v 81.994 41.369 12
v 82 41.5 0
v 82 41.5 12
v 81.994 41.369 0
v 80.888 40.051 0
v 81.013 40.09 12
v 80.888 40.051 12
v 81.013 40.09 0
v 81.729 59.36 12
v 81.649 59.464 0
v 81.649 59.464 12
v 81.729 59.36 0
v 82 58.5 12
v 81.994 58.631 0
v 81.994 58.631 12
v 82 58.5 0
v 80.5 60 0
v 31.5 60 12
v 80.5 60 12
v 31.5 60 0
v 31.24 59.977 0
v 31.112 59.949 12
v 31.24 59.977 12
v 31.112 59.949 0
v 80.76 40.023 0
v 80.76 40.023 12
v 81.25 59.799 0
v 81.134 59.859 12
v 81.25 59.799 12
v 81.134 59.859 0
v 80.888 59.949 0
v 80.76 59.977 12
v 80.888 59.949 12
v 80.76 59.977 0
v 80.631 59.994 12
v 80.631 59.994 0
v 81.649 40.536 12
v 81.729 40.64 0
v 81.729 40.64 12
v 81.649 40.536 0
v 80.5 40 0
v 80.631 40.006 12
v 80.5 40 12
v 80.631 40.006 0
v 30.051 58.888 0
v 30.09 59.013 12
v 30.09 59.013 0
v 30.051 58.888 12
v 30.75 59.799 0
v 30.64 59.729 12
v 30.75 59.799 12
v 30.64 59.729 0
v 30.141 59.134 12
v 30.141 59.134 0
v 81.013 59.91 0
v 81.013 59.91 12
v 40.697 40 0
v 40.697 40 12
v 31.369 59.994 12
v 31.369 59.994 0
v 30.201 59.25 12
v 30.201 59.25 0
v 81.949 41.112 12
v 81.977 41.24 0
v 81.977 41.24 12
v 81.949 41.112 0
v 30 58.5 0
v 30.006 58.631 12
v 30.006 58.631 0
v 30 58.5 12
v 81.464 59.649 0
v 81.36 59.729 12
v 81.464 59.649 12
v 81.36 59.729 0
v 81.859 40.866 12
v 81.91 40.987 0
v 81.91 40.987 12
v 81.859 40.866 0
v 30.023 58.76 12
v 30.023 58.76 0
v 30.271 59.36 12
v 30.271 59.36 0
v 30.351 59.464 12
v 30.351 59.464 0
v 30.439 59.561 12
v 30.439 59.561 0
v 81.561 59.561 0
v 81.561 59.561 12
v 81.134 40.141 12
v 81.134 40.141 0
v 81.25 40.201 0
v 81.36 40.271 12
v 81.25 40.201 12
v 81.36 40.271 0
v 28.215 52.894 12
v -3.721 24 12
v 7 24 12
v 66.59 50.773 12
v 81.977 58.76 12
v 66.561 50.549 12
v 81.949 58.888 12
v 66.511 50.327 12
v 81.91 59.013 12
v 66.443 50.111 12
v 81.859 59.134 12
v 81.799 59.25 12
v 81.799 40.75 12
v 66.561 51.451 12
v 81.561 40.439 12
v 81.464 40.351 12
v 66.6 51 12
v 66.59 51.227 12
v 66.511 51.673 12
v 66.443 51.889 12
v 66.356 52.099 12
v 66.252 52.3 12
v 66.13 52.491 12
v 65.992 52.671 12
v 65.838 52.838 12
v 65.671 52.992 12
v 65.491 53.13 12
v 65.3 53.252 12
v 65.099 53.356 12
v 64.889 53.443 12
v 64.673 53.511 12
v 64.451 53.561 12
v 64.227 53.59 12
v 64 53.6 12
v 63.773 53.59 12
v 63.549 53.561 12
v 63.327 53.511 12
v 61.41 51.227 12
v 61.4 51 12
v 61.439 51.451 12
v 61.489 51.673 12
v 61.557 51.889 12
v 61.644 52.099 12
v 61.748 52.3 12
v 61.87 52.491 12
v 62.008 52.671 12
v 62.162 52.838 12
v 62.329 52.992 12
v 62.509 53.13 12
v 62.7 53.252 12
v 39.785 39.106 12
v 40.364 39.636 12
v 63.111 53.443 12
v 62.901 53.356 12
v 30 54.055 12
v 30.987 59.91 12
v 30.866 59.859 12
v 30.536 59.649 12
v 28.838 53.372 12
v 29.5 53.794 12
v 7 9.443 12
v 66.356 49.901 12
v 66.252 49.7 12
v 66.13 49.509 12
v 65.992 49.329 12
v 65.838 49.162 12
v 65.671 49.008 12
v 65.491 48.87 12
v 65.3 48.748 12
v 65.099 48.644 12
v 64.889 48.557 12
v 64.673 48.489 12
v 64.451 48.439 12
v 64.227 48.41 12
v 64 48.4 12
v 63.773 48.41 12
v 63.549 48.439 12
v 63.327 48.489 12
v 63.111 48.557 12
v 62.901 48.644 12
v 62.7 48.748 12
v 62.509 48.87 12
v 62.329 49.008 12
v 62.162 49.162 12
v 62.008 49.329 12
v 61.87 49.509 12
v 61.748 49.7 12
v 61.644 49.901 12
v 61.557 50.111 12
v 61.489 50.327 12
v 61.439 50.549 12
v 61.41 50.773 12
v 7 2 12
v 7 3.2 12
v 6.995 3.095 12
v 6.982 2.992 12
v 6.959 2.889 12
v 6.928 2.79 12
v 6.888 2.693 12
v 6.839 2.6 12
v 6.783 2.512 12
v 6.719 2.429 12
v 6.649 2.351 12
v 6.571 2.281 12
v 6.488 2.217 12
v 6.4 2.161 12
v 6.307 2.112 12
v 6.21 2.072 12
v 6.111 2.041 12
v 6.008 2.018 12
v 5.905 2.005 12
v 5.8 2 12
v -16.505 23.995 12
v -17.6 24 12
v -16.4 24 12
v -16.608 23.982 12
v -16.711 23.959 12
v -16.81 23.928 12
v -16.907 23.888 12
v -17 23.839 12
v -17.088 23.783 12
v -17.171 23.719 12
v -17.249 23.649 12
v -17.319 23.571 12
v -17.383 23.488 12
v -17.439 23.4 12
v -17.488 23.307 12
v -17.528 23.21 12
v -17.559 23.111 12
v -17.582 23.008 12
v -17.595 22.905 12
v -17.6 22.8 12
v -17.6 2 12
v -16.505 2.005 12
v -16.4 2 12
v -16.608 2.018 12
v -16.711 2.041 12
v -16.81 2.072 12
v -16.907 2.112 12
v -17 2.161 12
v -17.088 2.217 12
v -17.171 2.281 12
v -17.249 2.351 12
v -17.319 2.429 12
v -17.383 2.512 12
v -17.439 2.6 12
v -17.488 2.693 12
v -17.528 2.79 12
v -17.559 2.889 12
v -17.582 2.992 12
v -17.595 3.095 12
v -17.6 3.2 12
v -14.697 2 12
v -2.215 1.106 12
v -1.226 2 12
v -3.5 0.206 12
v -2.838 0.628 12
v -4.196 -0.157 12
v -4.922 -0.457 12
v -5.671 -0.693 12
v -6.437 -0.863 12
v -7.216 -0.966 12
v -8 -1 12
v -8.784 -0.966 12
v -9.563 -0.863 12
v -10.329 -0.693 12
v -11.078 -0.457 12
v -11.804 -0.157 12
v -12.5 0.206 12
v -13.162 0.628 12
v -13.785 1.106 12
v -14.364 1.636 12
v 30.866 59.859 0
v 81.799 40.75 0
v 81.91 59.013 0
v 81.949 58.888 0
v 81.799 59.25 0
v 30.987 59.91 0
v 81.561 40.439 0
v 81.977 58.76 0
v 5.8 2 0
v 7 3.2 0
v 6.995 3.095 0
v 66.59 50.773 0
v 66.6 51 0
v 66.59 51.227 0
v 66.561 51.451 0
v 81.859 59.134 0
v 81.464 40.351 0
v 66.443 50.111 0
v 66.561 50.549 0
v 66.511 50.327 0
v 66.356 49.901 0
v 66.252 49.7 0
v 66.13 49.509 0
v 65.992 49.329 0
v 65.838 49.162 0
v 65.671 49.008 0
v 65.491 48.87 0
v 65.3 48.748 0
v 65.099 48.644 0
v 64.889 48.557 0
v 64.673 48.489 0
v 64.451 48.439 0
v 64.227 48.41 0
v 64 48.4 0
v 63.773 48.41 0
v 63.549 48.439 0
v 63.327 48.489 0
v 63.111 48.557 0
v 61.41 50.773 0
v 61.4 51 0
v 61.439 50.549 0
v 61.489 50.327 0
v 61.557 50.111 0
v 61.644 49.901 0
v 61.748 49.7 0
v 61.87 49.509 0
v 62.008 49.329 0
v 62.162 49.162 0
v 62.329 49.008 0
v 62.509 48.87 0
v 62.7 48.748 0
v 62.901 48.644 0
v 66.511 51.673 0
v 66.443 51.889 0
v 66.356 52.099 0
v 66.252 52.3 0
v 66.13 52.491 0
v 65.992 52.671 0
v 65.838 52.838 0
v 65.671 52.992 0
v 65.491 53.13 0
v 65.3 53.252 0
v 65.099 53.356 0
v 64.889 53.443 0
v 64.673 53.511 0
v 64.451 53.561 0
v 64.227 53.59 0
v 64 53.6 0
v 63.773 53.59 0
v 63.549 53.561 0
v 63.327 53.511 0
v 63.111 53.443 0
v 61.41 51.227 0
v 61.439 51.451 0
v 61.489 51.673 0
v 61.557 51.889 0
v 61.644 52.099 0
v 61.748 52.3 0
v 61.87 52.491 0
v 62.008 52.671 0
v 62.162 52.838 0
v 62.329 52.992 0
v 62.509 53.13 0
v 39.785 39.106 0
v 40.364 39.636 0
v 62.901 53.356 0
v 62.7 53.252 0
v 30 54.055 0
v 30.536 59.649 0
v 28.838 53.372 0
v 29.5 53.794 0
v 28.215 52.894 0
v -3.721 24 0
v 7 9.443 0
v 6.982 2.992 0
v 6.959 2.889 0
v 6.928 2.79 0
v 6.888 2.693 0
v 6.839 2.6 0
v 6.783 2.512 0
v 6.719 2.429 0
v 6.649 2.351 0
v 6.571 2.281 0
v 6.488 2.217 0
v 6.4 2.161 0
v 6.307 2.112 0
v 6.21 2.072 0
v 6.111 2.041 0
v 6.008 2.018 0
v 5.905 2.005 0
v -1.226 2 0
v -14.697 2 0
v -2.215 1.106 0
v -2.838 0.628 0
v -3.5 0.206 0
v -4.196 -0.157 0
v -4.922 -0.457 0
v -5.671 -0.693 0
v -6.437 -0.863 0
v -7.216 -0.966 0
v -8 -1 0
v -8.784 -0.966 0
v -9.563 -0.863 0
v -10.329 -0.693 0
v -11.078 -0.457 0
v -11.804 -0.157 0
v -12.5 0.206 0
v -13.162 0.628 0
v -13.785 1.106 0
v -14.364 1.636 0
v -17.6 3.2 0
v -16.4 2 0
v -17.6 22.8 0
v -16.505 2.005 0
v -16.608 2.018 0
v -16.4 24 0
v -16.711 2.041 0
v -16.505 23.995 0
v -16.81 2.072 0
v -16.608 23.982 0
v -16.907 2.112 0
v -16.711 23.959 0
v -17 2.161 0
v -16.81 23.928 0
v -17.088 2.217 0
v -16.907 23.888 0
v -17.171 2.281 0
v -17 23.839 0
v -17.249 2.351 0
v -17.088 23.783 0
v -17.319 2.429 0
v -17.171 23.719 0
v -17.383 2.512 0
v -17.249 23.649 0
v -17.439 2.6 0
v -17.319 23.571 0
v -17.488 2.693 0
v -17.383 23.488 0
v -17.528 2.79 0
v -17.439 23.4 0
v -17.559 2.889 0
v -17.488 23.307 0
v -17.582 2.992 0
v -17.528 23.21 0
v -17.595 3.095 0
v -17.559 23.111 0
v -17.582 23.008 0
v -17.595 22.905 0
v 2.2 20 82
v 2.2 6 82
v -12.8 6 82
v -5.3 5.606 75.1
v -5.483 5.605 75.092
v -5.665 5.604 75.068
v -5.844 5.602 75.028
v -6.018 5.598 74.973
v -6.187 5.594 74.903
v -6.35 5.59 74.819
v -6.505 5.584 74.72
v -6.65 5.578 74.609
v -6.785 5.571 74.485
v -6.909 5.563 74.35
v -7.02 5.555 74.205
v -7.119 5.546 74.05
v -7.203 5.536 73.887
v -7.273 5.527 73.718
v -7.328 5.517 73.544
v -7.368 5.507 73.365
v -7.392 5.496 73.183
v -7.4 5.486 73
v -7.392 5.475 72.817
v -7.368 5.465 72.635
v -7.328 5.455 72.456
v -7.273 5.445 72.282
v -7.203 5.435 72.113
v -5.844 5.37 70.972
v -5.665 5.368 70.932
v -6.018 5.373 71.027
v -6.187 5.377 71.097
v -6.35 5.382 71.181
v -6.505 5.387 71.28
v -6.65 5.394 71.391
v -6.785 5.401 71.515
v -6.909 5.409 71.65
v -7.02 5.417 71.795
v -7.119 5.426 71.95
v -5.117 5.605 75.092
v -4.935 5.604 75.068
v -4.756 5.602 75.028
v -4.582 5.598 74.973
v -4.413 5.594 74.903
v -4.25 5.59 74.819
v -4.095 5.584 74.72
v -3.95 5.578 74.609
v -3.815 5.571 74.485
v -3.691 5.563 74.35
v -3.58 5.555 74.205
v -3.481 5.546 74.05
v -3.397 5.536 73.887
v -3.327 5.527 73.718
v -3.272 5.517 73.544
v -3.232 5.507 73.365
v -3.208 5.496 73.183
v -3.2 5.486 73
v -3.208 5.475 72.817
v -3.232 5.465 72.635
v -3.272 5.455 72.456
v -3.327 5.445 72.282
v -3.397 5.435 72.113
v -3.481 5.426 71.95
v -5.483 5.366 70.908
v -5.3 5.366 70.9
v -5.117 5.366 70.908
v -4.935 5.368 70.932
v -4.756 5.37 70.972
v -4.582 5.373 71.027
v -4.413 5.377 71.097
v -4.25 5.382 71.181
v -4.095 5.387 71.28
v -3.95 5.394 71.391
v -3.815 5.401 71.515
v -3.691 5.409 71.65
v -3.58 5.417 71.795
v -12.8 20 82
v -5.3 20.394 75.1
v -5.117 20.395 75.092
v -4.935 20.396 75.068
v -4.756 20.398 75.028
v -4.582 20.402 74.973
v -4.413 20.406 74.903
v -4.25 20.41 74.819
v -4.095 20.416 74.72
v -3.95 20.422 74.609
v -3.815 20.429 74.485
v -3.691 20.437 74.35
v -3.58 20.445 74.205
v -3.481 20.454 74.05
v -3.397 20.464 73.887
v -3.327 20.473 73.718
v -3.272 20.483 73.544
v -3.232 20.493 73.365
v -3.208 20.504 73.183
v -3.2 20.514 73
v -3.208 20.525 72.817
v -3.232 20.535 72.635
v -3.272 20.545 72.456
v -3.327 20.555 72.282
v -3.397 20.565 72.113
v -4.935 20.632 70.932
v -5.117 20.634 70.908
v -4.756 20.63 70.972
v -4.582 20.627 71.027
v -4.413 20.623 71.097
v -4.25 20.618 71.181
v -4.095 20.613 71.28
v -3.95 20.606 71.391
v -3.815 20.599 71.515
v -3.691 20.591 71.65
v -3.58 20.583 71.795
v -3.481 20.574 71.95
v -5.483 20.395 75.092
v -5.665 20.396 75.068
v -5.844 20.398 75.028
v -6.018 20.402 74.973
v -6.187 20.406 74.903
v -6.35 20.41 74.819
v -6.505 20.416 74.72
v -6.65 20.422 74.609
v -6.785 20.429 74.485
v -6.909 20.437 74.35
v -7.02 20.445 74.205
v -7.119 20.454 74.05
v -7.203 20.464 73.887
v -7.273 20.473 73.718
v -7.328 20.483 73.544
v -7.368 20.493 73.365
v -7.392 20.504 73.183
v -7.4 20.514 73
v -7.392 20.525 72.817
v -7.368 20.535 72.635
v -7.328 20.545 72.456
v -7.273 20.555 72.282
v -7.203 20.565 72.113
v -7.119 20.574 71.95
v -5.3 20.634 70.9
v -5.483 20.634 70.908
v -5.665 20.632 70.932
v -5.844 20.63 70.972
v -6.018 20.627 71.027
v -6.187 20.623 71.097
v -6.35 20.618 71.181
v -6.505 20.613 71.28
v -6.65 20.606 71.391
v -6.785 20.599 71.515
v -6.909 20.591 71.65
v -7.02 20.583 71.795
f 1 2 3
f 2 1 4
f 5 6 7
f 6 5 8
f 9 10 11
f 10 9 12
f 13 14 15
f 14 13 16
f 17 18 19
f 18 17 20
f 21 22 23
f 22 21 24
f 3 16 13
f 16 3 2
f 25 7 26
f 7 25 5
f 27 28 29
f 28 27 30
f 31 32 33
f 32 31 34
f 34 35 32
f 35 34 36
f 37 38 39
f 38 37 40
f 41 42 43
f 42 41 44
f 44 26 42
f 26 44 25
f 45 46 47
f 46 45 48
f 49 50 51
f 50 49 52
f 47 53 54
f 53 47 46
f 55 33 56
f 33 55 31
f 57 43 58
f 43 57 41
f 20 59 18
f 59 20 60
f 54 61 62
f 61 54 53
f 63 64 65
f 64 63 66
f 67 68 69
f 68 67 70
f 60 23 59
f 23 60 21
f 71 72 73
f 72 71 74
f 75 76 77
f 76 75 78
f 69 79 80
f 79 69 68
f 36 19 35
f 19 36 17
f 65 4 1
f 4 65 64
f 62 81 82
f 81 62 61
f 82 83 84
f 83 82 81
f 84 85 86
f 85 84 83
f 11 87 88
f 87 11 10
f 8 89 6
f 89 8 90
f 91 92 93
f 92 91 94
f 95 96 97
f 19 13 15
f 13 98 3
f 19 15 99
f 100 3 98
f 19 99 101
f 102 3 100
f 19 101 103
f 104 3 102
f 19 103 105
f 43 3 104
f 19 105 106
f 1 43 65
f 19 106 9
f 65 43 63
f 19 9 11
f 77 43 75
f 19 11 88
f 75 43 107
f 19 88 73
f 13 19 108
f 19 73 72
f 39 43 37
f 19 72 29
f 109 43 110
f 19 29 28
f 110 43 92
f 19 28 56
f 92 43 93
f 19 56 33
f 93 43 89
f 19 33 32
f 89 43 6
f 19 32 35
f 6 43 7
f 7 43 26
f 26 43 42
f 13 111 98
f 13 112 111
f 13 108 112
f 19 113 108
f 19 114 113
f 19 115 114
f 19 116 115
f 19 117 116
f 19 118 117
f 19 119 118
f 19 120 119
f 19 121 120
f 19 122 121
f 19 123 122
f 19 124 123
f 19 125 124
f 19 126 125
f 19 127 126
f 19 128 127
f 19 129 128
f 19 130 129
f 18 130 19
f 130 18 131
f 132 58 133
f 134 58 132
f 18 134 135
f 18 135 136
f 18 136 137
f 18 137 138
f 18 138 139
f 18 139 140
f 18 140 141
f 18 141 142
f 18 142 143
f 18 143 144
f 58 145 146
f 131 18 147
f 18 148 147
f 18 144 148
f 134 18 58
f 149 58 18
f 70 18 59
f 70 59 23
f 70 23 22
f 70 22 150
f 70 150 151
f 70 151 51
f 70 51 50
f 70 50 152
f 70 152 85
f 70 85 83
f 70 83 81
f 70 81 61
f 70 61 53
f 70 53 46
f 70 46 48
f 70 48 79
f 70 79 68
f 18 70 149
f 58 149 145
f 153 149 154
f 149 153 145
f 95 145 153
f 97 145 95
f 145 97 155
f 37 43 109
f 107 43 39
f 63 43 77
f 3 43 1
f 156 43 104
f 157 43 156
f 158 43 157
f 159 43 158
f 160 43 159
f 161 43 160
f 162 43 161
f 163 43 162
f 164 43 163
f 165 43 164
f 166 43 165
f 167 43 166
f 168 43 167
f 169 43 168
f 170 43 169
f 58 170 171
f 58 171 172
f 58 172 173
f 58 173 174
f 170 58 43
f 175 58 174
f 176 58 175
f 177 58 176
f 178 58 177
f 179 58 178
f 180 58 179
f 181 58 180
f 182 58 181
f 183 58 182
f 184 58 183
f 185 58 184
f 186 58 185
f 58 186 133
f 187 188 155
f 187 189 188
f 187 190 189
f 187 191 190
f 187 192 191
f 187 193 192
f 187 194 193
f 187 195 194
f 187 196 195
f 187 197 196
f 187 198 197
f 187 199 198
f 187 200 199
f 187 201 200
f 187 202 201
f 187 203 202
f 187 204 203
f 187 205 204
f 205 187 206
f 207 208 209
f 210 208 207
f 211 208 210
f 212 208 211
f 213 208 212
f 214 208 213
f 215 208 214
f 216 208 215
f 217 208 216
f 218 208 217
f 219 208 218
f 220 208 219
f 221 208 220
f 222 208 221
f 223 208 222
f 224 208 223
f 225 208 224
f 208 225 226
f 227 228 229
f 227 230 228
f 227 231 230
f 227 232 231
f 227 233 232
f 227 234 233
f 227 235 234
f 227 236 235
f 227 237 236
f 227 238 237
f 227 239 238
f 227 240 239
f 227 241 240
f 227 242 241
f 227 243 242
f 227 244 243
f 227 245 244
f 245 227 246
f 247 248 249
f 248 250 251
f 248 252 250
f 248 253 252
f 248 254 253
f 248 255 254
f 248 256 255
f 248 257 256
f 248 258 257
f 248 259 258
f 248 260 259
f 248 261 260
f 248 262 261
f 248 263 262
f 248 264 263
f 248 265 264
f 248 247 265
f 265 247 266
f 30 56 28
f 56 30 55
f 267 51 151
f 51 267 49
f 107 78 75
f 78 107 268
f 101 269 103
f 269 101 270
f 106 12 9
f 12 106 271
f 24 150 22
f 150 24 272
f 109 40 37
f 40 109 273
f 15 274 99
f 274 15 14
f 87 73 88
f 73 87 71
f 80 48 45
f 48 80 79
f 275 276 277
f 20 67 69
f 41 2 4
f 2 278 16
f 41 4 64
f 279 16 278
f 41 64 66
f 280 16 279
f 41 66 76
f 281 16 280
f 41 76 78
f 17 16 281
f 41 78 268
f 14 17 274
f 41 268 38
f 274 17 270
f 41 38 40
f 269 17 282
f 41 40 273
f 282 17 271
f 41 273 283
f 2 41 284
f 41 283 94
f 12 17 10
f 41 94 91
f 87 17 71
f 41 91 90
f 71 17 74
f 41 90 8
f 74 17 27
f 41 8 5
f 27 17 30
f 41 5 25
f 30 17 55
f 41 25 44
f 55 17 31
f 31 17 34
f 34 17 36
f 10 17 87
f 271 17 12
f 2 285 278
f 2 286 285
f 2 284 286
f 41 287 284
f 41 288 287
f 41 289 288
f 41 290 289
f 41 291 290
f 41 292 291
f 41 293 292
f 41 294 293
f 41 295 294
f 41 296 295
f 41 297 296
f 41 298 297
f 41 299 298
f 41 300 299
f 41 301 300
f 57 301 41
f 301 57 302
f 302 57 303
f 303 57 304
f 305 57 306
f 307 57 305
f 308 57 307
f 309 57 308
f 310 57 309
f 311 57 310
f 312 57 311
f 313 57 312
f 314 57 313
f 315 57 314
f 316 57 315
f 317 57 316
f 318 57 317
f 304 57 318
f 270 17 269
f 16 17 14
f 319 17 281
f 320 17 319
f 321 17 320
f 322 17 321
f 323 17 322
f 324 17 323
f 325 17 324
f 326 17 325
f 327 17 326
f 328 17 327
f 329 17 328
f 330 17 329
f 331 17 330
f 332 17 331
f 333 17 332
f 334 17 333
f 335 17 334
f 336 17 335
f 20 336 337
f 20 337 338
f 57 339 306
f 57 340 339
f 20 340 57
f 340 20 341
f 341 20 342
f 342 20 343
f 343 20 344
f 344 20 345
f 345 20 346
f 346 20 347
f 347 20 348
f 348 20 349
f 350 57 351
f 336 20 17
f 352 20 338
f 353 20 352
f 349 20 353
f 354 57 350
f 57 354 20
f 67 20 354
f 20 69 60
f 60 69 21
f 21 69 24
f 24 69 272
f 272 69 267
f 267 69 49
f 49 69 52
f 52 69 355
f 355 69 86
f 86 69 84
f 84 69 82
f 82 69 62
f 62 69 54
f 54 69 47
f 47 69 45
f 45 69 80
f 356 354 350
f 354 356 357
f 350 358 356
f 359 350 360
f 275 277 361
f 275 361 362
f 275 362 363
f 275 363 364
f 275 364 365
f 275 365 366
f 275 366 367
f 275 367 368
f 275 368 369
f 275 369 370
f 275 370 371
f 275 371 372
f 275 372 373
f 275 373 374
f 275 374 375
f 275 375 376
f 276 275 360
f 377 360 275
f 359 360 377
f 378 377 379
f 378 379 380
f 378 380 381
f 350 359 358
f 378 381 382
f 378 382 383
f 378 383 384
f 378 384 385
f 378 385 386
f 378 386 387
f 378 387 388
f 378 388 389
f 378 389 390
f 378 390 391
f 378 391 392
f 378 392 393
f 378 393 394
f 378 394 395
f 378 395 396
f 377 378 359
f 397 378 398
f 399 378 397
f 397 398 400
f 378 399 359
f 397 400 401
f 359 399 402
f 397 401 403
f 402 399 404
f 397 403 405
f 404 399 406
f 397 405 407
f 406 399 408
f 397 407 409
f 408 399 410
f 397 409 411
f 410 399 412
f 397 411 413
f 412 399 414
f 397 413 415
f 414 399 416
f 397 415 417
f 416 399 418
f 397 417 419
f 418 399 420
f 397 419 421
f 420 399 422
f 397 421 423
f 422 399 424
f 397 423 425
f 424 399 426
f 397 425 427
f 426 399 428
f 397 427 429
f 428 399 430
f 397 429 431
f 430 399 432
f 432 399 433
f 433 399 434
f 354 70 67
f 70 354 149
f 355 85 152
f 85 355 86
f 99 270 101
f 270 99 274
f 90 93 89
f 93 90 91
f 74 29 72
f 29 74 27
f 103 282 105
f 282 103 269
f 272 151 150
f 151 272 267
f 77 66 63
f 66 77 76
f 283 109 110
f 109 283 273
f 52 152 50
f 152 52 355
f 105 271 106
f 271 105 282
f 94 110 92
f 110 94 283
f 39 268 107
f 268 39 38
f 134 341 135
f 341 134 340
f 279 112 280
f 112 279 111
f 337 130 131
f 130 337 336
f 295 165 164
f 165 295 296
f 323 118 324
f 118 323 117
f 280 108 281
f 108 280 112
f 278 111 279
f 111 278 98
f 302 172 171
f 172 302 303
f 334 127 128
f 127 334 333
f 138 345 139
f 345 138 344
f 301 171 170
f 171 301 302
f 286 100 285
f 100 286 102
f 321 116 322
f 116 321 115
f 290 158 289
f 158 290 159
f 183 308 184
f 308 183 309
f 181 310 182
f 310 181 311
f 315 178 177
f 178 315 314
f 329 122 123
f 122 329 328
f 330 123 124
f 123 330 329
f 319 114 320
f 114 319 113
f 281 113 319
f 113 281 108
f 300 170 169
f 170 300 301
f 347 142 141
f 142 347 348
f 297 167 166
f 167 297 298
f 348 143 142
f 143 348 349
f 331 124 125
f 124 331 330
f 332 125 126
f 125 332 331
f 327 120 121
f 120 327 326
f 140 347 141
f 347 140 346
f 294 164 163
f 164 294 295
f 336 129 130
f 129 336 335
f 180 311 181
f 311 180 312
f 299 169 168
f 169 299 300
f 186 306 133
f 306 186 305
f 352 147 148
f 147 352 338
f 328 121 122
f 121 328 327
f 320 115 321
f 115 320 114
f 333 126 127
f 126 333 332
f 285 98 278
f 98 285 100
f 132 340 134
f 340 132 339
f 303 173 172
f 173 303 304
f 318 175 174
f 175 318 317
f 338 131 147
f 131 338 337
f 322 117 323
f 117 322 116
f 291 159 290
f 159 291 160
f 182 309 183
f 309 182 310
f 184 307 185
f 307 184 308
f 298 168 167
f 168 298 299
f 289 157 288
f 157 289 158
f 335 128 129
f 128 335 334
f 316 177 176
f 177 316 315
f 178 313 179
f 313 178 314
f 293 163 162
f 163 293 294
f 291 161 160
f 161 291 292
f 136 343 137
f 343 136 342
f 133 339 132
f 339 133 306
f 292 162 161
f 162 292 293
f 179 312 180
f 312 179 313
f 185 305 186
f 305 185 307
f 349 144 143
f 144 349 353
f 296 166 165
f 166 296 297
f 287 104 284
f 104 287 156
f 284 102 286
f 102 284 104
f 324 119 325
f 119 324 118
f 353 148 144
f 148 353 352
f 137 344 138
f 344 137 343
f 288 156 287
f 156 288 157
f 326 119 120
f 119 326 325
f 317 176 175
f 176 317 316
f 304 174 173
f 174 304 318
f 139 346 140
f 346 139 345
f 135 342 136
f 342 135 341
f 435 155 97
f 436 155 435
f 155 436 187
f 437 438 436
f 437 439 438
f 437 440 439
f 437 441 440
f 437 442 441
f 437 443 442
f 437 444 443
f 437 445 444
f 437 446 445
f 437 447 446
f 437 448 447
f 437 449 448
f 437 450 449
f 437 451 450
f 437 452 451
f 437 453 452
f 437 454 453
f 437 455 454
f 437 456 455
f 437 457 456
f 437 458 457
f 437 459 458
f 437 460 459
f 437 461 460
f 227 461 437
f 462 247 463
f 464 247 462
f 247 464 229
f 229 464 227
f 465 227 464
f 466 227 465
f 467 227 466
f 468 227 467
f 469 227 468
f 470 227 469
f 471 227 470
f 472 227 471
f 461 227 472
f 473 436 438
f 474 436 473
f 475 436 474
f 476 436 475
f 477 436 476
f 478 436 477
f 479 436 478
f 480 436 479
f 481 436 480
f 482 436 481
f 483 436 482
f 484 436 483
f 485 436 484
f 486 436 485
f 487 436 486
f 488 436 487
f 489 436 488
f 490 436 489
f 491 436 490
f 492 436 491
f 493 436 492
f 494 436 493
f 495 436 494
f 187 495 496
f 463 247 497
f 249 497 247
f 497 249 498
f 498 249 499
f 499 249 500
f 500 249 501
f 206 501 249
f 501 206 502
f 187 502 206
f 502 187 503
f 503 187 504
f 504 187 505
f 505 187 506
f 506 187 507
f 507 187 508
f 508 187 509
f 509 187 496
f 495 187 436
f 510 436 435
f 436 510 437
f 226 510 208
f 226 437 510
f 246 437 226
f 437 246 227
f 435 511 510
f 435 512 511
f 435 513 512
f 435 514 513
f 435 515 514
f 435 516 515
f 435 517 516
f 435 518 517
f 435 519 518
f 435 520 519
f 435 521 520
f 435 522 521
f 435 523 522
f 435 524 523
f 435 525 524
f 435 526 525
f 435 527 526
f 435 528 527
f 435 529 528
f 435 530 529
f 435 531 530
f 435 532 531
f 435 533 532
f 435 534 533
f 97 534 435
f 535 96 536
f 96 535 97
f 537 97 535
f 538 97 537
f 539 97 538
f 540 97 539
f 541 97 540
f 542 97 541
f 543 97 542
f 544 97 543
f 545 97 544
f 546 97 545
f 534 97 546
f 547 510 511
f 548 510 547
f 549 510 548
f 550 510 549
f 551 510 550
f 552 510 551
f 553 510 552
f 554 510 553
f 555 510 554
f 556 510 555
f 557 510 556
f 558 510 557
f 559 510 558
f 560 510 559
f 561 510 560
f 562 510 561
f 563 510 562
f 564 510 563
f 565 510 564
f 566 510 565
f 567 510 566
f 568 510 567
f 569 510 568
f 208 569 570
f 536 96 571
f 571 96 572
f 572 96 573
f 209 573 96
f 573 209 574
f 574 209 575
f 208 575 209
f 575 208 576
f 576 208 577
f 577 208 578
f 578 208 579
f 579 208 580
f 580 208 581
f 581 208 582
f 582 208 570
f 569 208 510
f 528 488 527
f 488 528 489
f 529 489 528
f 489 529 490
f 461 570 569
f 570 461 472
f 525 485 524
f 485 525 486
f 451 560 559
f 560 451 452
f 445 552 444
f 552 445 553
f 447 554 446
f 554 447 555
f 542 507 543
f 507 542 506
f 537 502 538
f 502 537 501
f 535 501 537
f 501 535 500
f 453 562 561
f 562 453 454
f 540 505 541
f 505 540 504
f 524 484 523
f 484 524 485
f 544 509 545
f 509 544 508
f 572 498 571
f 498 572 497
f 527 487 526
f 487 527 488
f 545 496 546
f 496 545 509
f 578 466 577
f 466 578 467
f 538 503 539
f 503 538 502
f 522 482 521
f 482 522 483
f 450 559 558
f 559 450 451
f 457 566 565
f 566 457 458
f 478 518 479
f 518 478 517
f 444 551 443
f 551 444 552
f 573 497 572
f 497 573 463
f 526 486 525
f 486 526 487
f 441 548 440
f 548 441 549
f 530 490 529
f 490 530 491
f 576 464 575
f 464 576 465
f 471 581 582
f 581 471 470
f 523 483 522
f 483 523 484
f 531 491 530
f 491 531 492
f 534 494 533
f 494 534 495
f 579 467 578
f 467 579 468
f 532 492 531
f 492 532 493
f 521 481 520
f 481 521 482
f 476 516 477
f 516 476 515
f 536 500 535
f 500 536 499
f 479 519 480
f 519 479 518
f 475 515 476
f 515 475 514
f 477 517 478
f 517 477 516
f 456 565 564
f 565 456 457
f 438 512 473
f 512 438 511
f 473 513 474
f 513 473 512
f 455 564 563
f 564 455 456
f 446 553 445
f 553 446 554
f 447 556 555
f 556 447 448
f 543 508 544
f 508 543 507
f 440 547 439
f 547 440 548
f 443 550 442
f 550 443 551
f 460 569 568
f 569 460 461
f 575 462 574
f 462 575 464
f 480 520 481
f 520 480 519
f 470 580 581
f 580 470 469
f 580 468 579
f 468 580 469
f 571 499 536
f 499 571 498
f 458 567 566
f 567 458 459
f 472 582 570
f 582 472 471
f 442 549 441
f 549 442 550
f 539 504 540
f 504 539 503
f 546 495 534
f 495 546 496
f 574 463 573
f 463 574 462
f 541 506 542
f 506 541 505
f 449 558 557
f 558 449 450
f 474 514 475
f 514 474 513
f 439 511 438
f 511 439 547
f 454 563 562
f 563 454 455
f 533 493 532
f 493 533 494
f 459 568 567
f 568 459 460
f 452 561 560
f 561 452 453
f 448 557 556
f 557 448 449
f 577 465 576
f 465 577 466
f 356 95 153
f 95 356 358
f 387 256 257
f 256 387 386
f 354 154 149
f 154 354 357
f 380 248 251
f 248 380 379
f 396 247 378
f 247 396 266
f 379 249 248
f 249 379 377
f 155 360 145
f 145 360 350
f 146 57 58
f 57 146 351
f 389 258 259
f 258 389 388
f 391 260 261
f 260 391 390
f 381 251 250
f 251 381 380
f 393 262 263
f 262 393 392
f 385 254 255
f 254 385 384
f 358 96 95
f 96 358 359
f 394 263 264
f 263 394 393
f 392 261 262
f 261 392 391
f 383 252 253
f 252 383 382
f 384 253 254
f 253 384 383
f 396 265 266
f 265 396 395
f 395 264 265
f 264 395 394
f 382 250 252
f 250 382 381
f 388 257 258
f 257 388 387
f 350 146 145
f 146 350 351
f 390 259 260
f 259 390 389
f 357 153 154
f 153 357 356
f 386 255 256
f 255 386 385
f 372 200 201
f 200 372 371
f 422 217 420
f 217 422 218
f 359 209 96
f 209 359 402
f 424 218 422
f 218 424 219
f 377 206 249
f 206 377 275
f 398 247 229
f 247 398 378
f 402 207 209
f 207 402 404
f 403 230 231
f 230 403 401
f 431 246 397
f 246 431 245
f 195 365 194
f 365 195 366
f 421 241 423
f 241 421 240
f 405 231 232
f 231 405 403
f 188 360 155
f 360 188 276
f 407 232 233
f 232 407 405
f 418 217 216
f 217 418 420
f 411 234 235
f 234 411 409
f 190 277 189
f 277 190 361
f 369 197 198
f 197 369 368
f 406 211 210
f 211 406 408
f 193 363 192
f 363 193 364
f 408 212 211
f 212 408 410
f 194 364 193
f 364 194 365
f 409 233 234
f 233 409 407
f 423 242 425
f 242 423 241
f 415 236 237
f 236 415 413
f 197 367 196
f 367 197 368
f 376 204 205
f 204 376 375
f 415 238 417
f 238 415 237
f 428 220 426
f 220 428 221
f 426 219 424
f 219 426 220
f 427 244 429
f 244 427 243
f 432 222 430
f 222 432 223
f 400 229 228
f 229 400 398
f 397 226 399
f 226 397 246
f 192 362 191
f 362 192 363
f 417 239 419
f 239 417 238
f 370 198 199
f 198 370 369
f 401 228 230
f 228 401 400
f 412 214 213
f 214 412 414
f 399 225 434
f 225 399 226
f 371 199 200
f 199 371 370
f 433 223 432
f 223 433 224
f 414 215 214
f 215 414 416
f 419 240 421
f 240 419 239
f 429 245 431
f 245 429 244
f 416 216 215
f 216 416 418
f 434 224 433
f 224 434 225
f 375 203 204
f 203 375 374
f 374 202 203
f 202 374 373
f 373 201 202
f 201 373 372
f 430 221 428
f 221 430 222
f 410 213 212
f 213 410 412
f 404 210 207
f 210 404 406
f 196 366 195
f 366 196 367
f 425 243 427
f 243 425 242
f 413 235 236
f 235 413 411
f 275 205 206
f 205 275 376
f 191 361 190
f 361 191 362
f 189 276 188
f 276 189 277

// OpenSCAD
// Support_Cam_PI_IR_Cut_CR6_v4.scad
// Left CR-6 Pi IR-cut camera support bracket, rebuilt parametrically.
//
// This attempt intentionally focuses on the LEFT bracket only.  It does not
// import the STL.  The source STL was used only to measure the overall bounding
// box, the diagonal arm direction, the camera tab location, and hole positions.

/* [Left Bracket Dimensions] */
base_z = 0;
base_thickness = 12;
diagonal_arm_width = 18;
diagonal_arm_start = [-8, 8];
diagonal_arm_end = [34, 46];
camera_tab_origin = [30, 40, 0];
camera_tab_size = [52, 20, 12];
camera_hole_xy = [64, 51];
camera_hole_diameter = 5.2;
end_block_center = [-8, 8];
end_block_size = [13.2, 13.2, 12];
end_block_rotation = 45;

/* [Tower] */
tower_origin = [-17.6, 2, 12];
tower_bottom_size = [24.6, 22];
tower_top_size = [15, 14];
tower_height = 70;
tower_hole_y = 13;
tower_hole_z = 73;
tower_hole_diameter = 4.2;

/* [Preview] */
preview_color = true;
$fn = 72;

module maybe_color() {
    if (preview_color) color("palegreen") children();
    else children();
}

module bar_between(a, b, width, height) {
    hull() {
        translate([a[0], a[1], base_z]) cylinder(h = height, d = width);
        translate([b[0], b[1], base_z]) cylinder(h = height, d = width);
    }
}

module rounded_rect(size, radius = 1.5) {
    hull() {
        for (x = [radius, size[0] - radius])
            for (y = [radius, size[1] - radius])
                translate([x, y, 0]) cylinder(h = size[2], r = radius);
    }
}

module tapered_tower(origin, bottom_size, top_size, height) {
    bx = bottom_size[0];
    by = bottom_size[1];
    tx = top_size[0];
    ty = top_size[1];
    ox = (bx - tx) / 2;
    oy = (by - ty) / 2;

    translate(origin)
        polyhedron(
            points = [
                [0, 0, 0], [bx, 0, 0], [bx, by, 0], [0, by, 0],
                [ox, oy, height], [ox + tx, oy, height], [ox + tx, oy + ty, height], [ox, oy + ty, height]
            ],
            faces = [
                [0, 1, 2, 3], [4, 7, 6, 5],
                [0, 4, 5, 1], [1, 5, 6, 2],
                [2, 6, 7, 3], [3, 7, 4, 0]
            ]
        );
}

module tower_with_hole() {
    difference() {
        tapered_tower(tower_origin, tower_bottom_size, tower_top_size, tower_height);
        translate([tower_origin[0] + tower_bottom_size[0] / 2, tower_hole_y, tower_hole_z])
            rotate([90, 0, 0])
                cylinder(h = tower_bottom_size[1] + 4, d = tower_hole_diameter, center = true);
    }
}

module camera_tab() {
    difference() {
        translate(camera_tab_origin) rounded_rect(camera_tab_size, 1.5);
        translate([camera_hole_xy[0], camera_hole_xy[1], camera_tab_origin[2] - 0.5])
            cylinder(h = camera_tab_size[2] + 1, d = camera_hole_diameter);
    }
}

module rotated_end_block() {
    translate([end_block_center[0], end_block_center[1], base_z])
        rotate([0, 0, end_block_rotation])
            translate([-end_block_size[0] / 2, -end_block_size[1] / 2, 0])
                rounded_rect(end_block_size, 1.2);
}

module left_bracket() {
    maybe_color()
        union() {
            // Continuous lower assembly: end block, diagonal arm, camera tab, and a small tower pad overlap.
            rotated_end_block();
            bar_between(diagonal_arm_start, diagonal_arm_end, diagonal_arm_width, base_thickness);
            camera_tab();
            translate([tower_origin[0], tower_origin[1], base_z])
                rounded_rect([tower_bottom_size[0], tower_bottom_size[1], base_thickness], 1.2);

            // The measured left STL has a tall tapered upright directly on the tower pad.
            tower_with_hole();
        }
}

left_bracket();
